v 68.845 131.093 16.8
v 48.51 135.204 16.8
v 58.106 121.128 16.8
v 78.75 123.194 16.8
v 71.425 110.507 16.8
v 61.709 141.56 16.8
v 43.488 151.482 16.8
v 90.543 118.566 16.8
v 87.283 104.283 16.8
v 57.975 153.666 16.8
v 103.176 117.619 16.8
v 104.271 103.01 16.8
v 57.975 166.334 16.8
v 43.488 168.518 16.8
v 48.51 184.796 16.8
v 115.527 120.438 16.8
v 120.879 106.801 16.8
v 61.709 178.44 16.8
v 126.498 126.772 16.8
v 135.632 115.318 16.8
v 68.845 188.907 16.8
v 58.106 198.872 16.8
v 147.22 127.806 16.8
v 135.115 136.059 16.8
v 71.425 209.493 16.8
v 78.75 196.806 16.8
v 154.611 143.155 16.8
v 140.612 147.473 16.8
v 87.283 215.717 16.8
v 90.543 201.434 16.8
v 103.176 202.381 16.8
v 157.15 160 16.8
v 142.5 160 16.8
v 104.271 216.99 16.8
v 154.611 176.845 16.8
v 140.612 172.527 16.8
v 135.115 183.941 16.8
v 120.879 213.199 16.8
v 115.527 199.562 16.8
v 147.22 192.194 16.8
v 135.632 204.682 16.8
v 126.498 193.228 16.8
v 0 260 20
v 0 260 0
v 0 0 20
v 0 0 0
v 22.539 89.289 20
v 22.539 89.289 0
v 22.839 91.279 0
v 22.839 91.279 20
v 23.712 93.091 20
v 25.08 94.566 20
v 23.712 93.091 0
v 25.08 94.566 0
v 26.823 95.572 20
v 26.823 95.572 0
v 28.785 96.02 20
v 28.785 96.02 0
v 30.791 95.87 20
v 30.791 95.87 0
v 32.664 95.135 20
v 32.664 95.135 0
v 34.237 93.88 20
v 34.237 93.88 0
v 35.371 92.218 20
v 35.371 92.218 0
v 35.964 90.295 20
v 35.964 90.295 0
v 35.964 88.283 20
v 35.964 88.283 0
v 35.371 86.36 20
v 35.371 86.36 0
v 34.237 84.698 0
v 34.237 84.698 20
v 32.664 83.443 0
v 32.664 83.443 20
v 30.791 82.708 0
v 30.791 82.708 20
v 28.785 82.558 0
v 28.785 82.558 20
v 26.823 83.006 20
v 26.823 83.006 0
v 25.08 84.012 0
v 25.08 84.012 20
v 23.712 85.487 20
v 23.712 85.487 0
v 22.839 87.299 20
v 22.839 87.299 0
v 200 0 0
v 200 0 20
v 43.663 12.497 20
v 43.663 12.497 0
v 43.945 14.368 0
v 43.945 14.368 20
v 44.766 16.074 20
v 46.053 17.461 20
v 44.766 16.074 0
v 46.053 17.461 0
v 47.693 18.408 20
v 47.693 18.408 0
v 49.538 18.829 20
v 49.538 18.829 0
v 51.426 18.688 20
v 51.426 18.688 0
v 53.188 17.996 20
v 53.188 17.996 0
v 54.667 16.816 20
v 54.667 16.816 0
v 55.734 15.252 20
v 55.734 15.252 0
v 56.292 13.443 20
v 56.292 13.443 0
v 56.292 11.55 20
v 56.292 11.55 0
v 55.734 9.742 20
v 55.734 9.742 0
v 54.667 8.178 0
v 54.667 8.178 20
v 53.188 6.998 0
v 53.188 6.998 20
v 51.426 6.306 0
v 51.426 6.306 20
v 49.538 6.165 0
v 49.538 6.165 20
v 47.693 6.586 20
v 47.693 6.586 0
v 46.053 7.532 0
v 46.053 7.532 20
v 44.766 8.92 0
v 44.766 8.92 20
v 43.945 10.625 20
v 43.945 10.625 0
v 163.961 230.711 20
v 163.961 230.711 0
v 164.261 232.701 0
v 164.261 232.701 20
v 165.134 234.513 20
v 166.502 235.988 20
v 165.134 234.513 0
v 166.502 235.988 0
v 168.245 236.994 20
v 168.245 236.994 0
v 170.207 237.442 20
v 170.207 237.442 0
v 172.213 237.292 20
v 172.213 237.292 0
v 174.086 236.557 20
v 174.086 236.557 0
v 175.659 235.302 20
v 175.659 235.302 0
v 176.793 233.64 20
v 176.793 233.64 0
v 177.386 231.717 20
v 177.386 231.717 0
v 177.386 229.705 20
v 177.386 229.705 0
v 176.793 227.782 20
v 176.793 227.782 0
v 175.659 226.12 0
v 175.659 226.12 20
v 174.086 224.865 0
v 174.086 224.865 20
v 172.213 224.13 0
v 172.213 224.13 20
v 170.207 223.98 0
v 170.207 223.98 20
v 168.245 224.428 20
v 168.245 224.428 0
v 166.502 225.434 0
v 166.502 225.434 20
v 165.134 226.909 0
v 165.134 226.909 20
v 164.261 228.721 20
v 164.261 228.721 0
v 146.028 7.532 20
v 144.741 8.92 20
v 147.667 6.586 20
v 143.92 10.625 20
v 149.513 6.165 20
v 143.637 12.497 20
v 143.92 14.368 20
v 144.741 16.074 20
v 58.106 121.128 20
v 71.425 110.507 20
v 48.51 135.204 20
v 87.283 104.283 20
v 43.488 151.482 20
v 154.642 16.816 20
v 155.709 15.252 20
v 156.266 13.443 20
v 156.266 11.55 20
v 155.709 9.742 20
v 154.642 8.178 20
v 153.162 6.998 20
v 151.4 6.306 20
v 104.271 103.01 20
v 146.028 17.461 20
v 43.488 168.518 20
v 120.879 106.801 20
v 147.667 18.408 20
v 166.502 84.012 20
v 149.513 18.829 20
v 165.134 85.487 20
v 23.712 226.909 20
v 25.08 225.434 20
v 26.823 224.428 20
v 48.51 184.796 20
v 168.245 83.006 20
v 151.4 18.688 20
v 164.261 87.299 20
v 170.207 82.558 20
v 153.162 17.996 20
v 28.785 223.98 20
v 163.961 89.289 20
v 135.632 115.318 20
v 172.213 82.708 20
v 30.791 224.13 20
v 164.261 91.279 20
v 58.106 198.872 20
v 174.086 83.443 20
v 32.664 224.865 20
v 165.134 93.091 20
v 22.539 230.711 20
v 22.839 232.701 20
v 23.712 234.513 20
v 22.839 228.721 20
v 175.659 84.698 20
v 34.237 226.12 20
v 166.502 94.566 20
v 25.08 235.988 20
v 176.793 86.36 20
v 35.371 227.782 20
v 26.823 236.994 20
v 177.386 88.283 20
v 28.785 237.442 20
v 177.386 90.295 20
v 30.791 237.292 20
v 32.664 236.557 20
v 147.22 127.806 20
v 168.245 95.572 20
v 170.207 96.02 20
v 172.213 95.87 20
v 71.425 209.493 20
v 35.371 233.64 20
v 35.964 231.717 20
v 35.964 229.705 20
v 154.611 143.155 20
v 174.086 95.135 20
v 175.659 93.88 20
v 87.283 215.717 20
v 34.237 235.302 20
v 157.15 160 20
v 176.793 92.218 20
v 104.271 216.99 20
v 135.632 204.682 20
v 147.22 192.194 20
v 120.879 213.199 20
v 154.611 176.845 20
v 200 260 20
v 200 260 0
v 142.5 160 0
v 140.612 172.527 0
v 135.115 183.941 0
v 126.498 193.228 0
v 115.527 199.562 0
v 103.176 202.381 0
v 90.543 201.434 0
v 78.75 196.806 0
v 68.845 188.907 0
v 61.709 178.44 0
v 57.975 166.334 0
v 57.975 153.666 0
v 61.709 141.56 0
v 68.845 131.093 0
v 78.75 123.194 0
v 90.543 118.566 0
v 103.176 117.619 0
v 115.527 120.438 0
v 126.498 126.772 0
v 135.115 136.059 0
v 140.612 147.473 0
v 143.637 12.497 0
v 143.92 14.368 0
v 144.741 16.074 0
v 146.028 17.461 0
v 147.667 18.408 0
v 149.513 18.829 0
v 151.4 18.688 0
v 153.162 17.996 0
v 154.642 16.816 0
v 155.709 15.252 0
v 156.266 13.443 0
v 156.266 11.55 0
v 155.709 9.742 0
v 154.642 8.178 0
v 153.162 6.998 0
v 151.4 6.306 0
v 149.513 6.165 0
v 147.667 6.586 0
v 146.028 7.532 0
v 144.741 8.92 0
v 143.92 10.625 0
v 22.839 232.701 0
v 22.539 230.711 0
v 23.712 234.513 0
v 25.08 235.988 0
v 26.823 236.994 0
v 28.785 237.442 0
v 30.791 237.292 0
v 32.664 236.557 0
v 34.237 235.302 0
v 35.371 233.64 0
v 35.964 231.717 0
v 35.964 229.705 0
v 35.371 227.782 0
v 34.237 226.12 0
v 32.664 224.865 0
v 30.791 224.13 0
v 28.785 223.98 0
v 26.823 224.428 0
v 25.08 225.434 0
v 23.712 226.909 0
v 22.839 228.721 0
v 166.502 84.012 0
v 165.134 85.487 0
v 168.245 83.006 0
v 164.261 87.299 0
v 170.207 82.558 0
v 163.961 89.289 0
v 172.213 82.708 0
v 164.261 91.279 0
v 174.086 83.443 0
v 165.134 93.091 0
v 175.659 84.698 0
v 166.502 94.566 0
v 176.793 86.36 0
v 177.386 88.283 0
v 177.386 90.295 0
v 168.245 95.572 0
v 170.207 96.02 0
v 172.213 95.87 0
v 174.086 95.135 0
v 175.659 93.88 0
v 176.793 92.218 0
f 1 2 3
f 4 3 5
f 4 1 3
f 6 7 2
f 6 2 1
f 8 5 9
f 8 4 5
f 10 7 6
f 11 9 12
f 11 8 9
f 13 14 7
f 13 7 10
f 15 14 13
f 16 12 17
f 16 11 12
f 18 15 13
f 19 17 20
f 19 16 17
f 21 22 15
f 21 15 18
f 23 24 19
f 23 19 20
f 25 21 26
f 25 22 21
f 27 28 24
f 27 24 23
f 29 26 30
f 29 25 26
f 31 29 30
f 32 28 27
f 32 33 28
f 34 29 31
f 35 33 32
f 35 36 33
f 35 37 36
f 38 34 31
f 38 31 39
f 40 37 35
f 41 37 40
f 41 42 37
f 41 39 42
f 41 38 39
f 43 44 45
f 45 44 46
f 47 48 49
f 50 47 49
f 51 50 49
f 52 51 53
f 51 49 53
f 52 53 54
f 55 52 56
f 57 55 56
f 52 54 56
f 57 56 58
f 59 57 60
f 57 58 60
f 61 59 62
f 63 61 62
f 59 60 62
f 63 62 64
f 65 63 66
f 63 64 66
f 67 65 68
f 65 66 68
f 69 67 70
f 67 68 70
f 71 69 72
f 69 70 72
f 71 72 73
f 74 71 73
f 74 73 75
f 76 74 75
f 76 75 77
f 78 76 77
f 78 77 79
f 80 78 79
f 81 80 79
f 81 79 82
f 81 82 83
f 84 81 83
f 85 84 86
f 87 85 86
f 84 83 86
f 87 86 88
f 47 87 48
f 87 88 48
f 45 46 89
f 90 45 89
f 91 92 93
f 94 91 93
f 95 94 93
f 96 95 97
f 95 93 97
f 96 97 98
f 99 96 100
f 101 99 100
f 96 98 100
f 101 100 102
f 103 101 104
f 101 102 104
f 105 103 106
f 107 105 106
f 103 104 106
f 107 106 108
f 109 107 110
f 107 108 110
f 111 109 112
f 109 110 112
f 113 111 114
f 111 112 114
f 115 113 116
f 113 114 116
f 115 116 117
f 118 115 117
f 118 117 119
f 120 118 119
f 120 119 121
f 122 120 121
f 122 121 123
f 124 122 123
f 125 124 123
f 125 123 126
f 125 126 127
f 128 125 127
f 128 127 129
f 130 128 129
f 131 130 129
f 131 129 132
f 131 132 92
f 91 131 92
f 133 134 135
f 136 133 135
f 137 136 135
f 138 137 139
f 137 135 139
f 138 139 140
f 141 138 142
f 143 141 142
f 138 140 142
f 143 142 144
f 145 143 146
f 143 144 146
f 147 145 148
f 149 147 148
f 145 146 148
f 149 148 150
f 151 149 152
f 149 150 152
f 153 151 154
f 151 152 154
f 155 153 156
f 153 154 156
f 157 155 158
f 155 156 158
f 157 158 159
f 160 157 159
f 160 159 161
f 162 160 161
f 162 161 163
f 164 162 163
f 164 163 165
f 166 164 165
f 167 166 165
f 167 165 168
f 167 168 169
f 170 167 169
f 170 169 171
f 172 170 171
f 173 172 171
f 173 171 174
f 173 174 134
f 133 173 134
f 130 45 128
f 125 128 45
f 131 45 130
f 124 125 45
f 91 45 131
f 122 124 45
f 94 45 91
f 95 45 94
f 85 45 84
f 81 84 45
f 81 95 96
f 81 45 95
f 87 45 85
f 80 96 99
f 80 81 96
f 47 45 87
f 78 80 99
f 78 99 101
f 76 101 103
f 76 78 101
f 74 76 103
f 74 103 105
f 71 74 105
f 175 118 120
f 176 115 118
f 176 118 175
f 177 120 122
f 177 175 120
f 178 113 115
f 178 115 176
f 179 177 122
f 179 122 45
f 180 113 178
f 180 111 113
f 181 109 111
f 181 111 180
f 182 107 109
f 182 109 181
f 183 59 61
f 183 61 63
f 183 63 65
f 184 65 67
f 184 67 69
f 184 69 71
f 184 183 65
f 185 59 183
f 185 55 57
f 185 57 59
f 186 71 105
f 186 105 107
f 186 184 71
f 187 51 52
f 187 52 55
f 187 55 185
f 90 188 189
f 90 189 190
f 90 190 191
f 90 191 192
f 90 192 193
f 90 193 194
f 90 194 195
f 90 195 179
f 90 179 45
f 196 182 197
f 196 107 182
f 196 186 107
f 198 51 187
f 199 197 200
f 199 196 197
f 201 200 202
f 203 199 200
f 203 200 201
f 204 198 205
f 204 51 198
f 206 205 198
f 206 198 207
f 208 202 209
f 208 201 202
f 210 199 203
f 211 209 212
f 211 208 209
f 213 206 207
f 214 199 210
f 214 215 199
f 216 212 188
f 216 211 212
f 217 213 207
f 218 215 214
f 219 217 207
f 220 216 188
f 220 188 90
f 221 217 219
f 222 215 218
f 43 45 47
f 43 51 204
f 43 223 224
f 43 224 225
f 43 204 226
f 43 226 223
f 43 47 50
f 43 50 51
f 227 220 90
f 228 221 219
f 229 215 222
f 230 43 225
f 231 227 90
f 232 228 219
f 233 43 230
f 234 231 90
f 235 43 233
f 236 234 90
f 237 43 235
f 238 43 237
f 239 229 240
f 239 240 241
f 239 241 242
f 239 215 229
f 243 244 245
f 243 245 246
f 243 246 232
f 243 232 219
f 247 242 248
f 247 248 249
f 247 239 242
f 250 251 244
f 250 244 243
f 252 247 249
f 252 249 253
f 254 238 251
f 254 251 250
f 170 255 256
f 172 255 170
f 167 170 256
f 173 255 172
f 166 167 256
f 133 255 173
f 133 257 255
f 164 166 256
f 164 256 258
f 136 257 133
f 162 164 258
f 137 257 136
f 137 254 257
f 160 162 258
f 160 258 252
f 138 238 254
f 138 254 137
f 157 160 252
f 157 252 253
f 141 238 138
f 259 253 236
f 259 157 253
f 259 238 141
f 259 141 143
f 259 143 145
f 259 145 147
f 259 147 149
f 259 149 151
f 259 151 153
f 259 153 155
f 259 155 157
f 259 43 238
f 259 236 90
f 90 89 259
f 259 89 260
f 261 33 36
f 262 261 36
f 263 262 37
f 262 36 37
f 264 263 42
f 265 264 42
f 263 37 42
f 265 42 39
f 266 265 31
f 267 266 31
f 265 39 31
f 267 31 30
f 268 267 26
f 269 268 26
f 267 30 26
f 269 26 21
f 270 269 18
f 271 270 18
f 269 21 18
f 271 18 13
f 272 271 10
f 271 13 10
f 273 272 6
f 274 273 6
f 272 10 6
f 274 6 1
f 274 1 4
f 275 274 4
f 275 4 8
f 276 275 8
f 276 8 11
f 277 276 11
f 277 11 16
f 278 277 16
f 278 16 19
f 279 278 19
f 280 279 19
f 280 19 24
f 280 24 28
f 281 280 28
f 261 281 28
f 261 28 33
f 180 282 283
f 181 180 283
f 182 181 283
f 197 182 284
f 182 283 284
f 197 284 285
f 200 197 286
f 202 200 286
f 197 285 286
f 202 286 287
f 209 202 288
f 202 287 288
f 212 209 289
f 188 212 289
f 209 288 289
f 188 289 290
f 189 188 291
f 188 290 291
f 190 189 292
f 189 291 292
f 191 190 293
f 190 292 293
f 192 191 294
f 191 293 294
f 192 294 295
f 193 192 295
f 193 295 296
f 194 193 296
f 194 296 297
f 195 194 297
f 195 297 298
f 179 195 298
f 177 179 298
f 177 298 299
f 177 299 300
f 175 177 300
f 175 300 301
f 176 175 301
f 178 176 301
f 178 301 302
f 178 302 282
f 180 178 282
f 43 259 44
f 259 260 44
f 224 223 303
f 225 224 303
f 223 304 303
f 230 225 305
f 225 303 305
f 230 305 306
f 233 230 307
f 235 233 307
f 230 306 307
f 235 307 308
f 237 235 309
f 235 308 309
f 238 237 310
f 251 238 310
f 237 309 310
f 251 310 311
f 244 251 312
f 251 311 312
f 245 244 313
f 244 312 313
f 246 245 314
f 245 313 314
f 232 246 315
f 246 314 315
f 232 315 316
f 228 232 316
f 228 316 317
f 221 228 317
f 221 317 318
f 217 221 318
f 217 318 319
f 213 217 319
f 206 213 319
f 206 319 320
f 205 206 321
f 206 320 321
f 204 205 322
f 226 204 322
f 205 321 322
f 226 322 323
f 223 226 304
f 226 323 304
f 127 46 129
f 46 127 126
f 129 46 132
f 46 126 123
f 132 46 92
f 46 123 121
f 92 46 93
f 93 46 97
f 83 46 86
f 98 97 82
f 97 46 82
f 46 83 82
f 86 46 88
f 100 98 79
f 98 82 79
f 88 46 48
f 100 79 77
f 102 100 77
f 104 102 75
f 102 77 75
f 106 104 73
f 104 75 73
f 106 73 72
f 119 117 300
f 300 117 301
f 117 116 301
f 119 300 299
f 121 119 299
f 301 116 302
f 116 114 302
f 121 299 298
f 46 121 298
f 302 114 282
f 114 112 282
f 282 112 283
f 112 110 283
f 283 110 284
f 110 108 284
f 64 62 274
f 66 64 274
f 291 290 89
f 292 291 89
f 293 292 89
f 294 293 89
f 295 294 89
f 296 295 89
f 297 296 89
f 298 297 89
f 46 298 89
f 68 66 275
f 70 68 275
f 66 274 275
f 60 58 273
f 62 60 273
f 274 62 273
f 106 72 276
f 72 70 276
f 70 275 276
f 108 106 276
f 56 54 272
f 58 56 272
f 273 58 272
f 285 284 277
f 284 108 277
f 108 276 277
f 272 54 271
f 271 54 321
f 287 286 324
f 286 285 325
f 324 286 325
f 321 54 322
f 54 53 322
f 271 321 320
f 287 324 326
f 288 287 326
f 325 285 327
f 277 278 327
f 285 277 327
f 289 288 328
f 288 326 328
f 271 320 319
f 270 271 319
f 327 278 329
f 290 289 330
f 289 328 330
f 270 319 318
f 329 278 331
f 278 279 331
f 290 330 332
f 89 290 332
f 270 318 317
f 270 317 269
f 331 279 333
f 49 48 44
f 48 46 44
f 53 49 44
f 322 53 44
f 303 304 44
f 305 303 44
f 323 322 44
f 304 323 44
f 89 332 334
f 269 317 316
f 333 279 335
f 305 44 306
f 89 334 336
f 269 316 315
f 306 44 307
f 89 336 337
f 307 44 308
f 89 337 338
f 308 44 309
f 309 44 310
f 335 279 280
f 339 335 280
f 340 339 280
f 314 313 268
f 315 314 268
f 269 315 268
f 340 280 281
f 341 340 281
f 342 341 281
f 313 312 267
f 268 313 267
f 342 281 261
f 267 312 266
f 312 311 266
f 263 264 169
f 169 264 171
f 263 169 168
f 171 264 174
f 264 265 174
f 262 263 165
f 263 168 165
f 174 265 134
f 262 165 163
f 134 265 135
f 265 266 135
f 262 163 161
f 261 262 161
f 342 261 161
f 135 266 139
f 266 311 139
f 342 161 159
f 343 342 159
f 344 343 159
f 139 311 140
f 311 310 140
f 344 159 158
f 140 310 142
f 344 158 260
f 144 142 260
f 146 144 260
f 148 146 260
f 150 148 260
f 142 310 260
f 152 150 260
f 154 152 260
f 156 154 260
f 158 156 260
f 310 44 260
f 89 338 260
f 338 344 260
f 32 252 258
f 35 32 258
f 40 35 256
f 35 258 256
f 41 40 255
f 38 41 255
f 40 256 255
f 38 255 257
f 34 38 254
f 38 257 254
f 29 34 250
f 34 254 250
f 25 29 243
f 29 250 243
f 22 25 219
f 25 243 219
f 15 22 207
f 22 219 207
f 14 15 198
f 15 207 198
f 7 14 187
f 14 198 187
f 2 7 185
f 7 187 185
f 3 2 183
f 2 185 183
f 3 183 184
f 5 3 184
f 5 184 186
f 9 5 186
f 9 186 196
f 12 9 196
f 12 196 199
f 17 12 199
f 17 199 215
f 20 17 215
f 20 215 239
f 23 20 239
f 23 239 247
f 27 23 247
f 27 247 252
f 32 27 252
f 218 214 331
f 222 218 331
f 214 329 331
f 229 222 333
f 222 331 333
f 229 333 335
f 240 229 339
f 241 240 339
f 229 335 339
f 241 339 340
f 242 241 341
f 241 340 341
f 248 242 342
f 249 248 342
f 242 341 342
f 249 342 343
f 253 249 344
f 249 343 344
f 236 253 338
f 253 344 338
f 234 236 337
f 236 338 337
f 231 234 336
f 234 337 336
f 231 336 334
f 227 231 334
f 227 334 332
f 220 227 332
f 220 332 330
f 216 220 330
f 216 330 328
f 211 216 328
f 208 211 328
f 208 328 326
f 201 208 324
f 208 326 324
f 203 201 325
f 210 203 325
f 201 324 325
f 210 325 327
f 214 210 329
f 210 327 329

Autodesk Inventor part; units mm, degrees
ref_plane "YZ Plane" through (0, 0, 0) normal (1, 0, 0) x (0, 1, 0)
ref_plane "XZ Plane" through (0, 0, 0) normal (0, 1, 0) x (-1, 0, 0)
ref_plane "XY Plane" through (0, 0, 0) normal (0, 0, 1) x (1, 0, 0)
sketch "Sketch1" plane through (0, 0, 0) normal (0, 0, 1) x (1, 0, 0)
  line L0 (0, 0) -> (200, 0)
  line L1 (200, 0) -> (200, 260)
  line L2 (200, 260) -> (0, 260)
  line L3 (0, 260) -> (0, 0)
  dimension "d0" = 200
  dimension "d1" = 260
extrude "Extrusion1" add sketch "Sketch1" along normal blind 20
sketch "Sketch2" plane through (0, 0, 20) normal (0, 0, 1) x (1, 0, 0)
  circle A0 centre (100, 160) radius 42.5
  line L0 (200, 260) -> (0, 260) projected
  line L1 (0, 260) -> (0, 0) projected
  dimension "d4" = 85
  dimension "d5" = 100
  dimension "d6" = 100
extrude "Extrusion2" cut sketch "Sketch2" against normal blind 30
sketch "Sketch6" plane through (0, 0, 0) normal (0, 0, -1) x (-1, 0, 0)
  circle A0 centre (-29.289, 230.711) radius 6.75
  circle A1 centre (-170.711, 230.711) radius 6.75
  circle A2 centre (-170.711, 89.289) radius 6.75
  circle A3 centre (-29.289, 89.289) radius 6.75
  circle A4 centre (-100, 160) radius 42.5 projected
  circle A5 centre (-50.0126, 12.4968) radius 6.35
  circle A6 centre (-149.9874, 12.4968) radius 6.35
  line L0 (-200, 0) -> (-200, 260) projected
  line L1 (0, 260) -> (0, 0) projected
  line L2 (0, 0) -> (-200, 0) projected
  dimension "d18" = 70.711
  dimension "d19" = 70.711
  dimension "d20" = 70.711
  dimension "d21" = 70.711
  dimension "d22" = 70.711
  dimension "d23" = 70.711
  dimension "d24" = 70.711
  dimension "d25" = 70.711
  dimension "d26" = 13.5
  dimension "d27" = 13.5
  dimension "d28" = 13.5
  dimension "d29" = 13.5
  dimension "d57" = 12.7
  dimension "d58" = 12.7
  dimension "d59" = 50.0126
  dimension "d60" = 50.0126
  dimension "d61" = 12.4968
  dimension "d62" = 12.4968
extrude "Extrusion6" cut sketch "Sketch6" against normal blind 20 contours A0 | A1 | A2 | A3 | A5 | A6
sketch "Sketch12" plane through (0, 0, 20) normal (0, 0, 1) x (1, 0, 0)
  circle A0 centre (100, 160) radius 42.5 projected
  circle A1 centre (100, 160) radius 57.15
  point P0 (0, 0)
  dimension "d66" = 114.3
extrude "Extrusion11" cut sketch "Sketch12" against normal blind 3.2 contours A0 | A1
equation "\"d19\" = d18"
equation "\"d20\" = d18"
equation "\"d21\" = d19"
equation "\"d22\" = d20"
equation "\"d23\" = d22"
equation "\"d24\" = d23"
equation "\"d25\" = d23"
equation "\"d58\" = d57"
properties part number "FloorMount"
